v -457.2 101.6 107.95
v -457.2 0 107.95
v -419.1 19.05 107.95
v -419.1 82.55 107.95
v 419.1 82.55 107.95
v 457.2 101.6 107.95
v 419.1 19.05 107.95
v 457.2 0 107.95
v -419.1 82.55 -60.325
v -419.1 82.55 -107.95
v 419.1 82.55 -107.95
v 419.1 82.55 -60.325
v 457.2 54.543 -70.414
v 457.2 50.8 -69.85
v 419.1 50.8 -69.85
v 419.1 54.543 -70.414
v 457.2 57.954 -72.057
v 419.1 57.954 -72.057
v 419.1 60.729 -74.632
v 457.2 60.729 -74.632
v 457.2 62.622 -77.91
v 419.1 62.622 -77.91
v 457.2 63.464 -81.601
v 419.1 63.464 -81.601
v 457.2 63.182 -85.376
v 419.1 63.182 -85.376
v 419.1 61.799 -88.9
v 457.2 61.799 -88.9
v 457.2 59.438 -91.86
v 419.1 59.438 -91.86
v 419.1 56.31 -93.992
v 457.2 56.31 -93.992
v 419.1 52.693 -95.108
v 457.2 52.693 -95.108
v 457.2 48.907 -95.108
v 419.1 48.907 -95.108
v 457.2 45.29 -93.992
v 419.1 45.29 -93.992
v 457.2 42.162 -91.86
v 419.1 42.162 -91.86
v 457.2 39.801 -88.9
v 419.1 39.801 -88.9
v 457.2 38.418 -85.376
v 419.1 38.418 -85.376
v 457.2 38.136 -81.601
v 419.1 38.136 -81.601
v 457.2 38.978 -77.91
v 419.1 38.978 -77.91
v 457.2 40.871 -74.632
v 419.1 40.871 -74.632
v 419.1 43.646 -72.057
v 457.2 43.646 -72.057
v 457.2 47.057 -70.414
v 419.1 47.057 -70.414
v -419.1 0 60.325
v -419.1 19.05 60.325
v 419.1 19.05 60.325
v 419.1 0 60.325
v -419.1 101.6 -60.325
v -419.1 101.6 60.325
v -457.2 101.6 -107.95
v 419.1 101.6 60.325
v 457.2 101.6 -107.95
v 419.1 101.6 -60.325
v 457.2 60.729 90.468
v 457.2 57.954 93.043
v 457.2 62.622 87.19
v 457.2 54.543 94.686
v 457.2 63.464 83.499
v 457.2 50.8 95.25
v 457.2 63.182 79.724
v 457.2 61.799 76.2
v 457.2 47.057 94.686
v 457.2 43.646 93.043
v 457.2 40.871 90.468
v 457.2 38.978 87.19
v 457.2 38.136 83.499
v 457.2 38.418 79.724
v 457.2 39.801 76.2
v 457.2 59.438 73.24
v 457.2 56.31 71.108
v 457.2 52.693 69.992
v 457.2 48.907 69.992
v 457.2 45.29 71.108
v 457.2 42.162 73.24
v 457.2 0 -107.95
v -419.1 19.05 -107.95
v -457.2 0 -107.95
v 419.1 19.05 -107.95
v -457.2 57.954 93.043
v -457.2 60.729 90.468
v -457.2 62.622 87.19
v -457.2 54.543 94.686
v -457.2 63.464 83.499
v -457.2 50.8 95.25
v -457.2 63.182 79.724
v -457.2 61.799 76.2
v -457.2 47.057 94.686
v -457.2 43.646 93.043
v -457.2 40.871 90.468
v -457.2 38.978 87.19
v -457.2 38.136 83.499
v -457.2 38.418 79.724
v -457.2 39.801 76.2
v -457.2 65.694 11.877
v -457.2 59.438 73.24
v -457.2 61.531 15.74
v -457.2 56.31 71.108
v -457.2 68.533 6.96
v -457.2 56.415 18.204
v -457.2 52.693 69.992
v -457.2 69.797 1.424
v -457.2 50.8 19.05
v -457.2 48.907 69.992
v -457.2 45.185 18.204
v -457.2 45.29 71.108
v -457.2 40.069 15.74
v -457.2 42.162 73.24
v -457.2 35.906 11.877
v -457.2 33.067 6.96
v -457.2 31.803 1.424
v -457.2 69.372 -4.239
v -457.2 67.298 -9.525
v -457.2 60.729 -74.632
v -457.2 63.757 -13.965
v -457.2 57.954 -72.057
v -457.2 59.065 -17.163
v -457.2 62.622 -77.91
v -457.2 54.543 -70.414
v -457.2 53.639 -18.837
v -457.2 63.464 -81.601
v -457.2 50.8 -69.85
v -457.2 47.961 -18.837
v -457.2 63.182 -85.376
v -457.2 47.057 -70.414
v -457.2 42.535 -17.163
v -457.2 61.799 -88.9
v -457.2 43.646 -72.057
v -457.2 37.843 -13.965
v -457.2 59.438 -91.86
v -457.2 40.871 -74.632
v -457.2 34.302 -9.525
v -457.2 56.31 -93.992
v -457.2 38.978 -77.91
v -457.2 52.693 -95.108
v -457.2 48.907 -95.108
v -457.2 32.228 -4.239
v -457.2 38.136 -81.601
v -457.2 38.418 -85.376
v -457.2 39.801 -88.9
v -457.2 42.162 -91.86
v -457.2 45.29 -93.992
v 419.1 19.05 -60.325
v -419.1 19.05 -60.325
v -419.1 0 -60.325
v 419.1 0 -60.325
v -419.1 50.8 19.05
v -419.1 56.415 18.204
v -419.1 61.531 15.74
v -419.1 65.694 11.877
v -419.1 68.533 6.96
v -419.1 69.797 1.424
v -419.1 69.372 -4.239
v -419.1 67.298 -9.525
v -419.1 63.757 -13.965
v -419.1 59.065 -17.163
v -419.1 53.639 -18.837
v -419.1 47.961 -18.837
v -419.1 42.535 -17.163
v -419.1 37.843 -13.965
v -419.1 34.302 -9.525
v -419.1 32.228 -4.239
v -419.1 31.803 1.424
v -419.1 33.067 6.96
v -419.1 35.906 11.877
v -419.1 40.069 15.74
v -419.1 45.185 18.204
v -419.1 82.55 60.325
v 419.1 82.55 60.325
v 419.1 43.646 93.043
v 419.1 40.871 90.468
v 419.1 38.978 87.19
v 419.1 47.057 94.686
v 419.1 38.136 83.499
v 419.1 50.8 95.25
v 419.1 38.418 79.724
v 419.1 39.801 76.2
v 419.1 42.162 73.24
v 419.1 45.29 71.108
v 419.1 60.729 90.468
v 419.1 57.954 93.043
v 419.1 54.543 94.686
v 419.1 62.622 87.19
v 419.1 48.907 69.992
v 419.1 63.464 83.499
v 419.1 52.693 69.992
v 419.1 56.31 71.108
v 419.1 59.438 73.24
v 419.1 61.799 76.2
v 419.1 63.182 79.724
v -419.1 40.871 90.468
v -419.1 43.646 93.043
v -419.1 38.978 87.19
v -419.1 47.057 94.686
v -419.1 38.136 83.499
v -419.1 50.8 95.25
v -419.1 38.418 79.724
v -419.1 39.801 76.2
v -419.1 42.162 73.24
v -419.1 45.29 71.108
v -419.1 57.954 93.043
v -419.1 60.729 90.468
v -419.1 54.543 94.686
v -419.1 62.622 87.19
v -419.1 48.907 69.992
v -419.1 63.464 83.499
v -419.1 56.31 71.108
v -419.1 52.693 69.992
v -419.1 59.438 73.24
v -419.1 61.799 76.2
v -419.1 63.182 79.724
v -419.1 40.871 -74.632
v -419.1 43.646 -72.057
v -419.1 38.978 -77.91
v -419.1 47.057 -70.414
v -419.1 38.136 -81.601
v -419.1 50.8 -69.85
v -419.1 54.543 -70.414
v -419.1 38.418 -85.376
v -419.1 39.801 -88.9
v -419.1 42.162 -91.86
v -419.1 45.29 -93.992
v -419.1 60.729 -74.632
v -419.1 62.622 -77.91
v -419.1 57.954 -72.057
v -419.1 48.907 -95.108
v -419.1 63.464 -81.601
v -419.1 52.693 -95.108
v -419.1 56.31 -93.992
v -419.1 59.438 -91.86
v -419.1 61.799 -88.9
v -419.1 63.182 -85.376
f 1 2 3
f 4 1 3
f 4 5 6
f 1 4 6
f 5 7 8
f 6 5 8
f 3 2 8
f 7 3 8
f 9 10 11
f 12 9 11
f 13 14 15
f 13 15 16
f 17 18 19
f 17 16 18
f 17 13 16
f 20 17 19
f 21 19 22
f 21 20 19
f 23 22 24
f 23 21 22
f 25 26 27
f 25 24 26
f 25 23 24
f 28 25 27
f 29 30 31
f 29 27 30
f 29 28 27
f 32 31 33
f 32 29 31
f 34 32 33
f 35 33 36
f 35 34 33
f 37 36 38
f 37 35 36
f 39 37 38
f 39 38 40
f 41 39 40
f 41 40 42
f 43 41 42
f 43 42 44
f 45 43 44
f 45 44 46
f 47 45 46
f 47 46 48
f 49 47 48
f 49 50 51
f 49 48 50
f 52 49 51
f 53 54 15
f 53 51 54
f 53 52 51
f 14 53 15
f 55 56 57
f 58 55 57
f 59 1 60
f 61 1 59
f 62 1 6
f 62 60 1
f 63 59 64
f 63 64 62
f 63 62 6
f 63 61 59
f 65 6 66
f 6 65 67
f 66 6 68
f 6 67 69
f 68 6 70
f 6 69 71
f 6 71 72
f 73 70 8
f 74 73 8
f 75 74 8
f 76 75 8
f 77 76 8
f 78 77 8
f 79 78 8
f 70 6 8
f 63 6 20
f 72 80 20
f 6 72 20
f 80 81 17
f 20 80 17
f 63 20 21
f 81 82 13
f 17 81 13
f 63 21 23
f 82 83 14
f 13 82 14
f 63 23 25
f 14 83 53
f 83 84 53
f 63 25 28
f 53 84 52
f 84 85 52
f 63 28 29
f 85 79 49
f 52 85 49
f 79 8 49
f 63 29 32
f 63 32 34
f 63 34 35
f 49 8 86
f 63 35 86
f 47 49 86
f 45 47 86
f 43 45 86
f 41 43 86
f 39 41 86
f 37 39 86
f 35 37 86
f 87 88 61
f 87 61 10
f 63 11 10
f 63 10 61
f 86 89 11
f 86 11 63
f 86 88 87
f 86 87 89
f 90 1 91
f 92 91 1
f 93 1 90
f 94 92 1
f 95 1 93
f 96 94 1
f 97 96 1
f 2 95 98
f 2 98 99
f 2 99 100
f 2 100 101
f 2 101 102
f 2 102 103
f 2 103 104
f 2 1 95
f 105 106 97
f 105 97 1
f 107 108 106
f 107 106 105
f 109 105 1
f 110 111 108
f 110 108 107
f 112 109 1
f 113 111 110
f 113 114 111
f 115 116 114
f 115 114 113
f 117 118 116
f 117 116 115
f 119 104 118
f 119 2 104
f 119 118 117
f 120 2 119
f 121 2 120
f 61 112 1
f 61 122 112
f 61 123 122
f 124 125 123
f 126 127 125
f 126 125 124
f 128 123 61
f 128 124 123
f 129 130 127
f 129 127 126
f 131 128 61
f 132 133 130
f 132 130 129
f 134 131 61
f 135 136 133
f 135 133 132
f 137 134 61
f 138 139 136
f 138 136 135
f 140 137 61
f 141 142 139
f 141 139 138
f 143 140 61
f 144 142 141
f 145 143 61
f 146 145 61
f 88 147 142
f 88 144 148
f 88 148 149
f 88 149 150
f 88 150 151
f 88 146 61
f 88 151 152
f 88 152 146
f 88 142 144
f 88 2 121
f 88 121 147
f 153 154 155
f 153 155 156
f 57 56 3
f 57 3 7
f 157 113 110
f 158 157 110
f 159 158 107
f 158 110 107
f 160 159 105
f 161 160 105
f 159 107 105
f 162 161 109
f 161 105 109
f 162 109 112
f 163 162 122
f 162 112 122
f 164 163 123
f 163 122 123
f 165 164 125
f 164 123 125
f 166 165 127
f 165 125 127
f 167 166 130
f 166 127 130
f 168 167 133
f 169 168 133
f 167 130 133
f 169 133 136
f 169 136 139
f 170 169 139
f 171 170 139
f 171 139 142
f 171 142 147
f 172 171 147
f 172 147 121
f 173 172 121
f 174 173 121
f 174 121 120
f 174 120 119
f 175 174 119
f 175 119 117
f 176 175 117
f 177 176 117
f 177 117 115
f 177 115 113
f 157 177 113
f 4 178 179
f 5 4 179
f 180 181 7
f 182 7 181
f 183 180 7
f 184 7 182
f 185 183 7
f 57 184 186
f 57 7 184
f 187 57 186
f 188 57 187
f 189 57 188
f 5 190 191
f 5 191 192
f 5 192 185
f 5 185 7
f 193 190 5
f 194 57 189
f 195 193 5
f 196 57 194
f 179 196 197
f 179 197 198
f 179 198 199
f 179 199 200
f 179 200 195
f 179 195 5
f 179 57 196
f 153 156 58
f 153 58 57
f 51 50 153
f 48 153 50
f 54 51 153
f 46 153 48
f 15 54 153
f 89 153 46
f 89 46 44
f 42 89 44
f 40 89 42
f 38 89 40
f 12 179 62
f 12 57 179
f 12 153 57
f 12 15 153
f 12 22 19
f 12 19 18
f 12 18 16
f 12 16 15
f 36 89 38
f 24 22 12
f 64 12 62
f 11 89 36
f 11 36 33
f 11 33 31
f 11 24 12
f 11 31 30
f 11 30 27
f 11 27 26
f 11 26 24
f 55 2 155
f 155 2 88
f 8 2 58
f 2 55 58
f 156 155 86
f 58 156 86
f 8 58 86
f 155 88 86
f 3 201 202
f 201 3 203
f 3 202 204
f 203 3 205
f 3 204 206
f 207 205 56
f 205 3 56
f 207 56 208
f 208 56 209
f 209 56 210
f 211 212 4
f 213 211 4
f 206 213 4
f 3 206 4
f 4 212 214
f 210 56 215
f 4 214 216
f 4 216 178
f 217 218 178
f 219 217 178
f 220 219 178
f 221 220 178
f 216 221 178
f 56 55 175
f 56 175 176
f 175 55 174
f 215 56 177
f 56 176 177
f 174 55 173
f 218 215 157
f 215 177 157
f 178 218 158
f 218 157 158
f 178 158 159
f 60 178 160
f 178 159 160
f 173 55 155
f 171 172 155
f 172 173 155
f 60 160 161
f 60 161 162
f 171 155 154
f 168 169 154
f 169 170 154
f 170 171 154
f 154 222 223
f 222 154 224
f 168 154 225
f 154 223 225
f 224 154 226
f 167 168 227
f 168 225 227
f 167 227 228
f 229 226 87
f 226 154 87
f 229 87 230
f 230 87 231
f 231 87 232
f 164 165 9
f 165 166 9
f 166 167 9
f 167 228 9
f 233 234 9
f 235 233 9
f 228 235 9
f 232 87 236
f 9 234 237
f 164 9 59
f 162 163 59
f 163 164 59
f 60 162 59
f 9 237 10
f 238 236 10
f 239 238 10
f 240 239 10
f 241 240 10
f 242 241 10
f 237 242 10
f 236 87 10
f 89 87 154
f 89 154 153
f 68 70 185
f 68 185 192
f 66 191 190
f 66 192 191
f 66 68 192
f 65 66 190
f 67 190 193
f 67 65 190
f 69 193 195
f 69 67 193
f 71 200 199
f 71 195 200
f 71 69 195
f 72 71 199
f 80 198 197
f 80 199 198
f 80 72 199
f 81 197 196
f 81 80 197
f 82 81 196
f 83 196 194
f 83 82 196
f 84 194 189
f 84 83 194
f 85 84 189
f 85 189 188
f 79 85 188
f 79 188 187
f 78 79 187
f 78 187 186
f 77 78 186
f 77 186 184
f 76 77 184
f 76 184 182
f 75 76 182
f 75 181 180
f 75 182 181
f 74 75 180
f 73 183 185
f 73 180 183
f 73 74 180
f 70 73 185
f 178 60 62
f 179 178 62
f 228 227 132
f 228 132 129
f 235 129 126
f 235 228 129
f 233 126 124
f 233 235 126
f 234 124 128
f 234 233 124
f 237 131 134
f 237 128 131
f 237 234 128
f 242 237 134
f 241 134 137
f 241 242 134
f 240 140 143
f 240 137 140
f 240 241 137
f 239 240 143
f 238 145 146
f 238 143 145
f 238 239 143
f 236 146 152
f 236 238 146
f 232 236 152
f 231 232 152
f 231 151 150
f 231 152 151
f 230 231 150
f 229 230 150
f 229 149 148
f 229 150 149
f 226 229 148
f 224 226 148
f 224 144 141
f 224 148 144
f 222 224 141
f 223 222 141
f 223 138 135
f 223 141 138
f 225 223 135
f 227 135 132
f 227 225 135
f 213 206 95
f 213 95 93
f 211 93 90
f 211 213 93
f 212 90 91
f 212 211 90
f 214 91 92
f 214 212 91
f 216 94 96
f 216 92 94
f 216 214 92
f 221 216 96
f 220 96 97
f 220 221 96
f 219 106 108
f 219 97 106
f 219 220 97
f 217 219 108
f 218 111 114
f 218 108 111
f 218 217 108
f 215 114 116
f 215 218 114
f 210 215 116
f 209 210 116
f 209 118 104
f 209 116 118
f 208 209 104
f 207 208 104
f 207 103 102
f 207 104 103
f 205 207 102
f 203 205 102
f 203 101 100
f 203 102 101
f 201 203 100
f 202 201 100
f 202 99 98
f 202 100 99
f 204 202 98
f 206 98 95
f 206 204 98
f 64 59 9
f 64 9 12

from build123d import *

# Parameters (mm, degrees)
SKETCH1_W               = 914.4
SKETCH1_H               = 215.9
BOSS_EXTRUDE1_DEPTH     = 101.6
CUT_EXTRUDE1_REACH      = 482.633
SKETCH2_W               = 838.2
SKETCH2_H               = 120.65
CUT_EXTRUDE2_DEPTH      = 516.720088808
CUT_EXTRUDE2_DEPTH_BACK = 516.720088808
SKETCH3_W               = 838.2
SKETCH3_H               = 63.5
CUT_EXTRUDE3_DEPTH      = 927.33855717
CUT_EXTRUDE3_DEPTH_BACK = 927.33855717
SKETCH4_R               = 12.7
CUT_EXTRUDE4_REACH      = 928.339
SKETCH5_R               = 19.05


with BuildPart() as part:
    # Sketch1 → Boss-Extrude1 (new body)
    with BuildSketch(Plane(origin=(0, 0, 0), x_dir=(1, 0, 0), z_dir=(0, 1, 0))):
        Rectangle(SKETCH1_W, SKETCH1_H)
    extrude(amount=BOSS_EXTRUDE1_DEPTH)

    # Sketch2 → Cut-Extrude1 (cut, up to next)
    with BuildSketch(Plane(origin=(0, 101.6, 0), x_dir=(1, 0, 0), z_dir=(0, 1, 0)), mode=Mode.PRIVATE) as cut_extrude1_sk1:
        Rectangle(SKETCH2_W, SKETCH2_H)
    cut_extrude1_tool1 = extrude(cut_extrude1_sk1.sketch, amount=-CUT_EXTRUDE1_REACH, mode=Mode.PRIVATE) & part.part
    add(cut_extrude1_tool1.solids().sort_by_distance((0, 101.6, 0))[0], mode=Mode.SUBTRACT)

    # Sketch3 → Cut-Extrude2 (cut, two sides: drawn at the far end of the back side and taken through both)
    with BuildSketch(Plane.XY.offset(107.95).offset(-CUT_EXTRUDE2_DEPTH_BACK)):
        with Locations((0, 50.8)):
            Rectangle(SKETCH3_W, SKETCH3_H)
    extrude(amount=CUT_EXTRUDE2_DEPTH + CUT_EXTRUDE2_DEPTH_BACK, mode=Mode.SUBTRACT)

    # Sketch4 → Cut-Extrude3 (cut, two sides: drawn at the far end of the back side and taken through both)
    with BuildSketch(Plane.ZY.offset(457.2).offset(-CUT_EXTRUDE3_DEPTH_BACK)):
        with Locations((82.55, 50.8)):
            Circle(SKETCH4_R)
        with Locations((-82.55, 50.8)):
            Circle(SKETCH4_R)
    extrude(amount=CUT_EXTRUDE3_DEPTH + CUT_EXTRUDE3_DEPTH_BACK, mode=Mode.SUBTRACT)

    # Sketch5 → Cut-Extrude4 (cut, up to next)
    with BuildSketch(Plane.ZY.offset(457.2), mode=Mode.PRIVATE) as cut_extrude4_sk1:
        with Locations((0, 50.8)):
            Circle(SKETCH5_R)
    cut_extrude4_tool1 = extrude(cut_extrude4_sk1.sketch, amount=-CUT_EXTRUDE4_REACH, mode=Mode.PRIVATE) & part.part
    add(cut_extrude4_tool1.solids().sort_by_distance((-457.2, 50.8, 0))[0], mode=Mode.SUBTRACT)


solid = part.part
